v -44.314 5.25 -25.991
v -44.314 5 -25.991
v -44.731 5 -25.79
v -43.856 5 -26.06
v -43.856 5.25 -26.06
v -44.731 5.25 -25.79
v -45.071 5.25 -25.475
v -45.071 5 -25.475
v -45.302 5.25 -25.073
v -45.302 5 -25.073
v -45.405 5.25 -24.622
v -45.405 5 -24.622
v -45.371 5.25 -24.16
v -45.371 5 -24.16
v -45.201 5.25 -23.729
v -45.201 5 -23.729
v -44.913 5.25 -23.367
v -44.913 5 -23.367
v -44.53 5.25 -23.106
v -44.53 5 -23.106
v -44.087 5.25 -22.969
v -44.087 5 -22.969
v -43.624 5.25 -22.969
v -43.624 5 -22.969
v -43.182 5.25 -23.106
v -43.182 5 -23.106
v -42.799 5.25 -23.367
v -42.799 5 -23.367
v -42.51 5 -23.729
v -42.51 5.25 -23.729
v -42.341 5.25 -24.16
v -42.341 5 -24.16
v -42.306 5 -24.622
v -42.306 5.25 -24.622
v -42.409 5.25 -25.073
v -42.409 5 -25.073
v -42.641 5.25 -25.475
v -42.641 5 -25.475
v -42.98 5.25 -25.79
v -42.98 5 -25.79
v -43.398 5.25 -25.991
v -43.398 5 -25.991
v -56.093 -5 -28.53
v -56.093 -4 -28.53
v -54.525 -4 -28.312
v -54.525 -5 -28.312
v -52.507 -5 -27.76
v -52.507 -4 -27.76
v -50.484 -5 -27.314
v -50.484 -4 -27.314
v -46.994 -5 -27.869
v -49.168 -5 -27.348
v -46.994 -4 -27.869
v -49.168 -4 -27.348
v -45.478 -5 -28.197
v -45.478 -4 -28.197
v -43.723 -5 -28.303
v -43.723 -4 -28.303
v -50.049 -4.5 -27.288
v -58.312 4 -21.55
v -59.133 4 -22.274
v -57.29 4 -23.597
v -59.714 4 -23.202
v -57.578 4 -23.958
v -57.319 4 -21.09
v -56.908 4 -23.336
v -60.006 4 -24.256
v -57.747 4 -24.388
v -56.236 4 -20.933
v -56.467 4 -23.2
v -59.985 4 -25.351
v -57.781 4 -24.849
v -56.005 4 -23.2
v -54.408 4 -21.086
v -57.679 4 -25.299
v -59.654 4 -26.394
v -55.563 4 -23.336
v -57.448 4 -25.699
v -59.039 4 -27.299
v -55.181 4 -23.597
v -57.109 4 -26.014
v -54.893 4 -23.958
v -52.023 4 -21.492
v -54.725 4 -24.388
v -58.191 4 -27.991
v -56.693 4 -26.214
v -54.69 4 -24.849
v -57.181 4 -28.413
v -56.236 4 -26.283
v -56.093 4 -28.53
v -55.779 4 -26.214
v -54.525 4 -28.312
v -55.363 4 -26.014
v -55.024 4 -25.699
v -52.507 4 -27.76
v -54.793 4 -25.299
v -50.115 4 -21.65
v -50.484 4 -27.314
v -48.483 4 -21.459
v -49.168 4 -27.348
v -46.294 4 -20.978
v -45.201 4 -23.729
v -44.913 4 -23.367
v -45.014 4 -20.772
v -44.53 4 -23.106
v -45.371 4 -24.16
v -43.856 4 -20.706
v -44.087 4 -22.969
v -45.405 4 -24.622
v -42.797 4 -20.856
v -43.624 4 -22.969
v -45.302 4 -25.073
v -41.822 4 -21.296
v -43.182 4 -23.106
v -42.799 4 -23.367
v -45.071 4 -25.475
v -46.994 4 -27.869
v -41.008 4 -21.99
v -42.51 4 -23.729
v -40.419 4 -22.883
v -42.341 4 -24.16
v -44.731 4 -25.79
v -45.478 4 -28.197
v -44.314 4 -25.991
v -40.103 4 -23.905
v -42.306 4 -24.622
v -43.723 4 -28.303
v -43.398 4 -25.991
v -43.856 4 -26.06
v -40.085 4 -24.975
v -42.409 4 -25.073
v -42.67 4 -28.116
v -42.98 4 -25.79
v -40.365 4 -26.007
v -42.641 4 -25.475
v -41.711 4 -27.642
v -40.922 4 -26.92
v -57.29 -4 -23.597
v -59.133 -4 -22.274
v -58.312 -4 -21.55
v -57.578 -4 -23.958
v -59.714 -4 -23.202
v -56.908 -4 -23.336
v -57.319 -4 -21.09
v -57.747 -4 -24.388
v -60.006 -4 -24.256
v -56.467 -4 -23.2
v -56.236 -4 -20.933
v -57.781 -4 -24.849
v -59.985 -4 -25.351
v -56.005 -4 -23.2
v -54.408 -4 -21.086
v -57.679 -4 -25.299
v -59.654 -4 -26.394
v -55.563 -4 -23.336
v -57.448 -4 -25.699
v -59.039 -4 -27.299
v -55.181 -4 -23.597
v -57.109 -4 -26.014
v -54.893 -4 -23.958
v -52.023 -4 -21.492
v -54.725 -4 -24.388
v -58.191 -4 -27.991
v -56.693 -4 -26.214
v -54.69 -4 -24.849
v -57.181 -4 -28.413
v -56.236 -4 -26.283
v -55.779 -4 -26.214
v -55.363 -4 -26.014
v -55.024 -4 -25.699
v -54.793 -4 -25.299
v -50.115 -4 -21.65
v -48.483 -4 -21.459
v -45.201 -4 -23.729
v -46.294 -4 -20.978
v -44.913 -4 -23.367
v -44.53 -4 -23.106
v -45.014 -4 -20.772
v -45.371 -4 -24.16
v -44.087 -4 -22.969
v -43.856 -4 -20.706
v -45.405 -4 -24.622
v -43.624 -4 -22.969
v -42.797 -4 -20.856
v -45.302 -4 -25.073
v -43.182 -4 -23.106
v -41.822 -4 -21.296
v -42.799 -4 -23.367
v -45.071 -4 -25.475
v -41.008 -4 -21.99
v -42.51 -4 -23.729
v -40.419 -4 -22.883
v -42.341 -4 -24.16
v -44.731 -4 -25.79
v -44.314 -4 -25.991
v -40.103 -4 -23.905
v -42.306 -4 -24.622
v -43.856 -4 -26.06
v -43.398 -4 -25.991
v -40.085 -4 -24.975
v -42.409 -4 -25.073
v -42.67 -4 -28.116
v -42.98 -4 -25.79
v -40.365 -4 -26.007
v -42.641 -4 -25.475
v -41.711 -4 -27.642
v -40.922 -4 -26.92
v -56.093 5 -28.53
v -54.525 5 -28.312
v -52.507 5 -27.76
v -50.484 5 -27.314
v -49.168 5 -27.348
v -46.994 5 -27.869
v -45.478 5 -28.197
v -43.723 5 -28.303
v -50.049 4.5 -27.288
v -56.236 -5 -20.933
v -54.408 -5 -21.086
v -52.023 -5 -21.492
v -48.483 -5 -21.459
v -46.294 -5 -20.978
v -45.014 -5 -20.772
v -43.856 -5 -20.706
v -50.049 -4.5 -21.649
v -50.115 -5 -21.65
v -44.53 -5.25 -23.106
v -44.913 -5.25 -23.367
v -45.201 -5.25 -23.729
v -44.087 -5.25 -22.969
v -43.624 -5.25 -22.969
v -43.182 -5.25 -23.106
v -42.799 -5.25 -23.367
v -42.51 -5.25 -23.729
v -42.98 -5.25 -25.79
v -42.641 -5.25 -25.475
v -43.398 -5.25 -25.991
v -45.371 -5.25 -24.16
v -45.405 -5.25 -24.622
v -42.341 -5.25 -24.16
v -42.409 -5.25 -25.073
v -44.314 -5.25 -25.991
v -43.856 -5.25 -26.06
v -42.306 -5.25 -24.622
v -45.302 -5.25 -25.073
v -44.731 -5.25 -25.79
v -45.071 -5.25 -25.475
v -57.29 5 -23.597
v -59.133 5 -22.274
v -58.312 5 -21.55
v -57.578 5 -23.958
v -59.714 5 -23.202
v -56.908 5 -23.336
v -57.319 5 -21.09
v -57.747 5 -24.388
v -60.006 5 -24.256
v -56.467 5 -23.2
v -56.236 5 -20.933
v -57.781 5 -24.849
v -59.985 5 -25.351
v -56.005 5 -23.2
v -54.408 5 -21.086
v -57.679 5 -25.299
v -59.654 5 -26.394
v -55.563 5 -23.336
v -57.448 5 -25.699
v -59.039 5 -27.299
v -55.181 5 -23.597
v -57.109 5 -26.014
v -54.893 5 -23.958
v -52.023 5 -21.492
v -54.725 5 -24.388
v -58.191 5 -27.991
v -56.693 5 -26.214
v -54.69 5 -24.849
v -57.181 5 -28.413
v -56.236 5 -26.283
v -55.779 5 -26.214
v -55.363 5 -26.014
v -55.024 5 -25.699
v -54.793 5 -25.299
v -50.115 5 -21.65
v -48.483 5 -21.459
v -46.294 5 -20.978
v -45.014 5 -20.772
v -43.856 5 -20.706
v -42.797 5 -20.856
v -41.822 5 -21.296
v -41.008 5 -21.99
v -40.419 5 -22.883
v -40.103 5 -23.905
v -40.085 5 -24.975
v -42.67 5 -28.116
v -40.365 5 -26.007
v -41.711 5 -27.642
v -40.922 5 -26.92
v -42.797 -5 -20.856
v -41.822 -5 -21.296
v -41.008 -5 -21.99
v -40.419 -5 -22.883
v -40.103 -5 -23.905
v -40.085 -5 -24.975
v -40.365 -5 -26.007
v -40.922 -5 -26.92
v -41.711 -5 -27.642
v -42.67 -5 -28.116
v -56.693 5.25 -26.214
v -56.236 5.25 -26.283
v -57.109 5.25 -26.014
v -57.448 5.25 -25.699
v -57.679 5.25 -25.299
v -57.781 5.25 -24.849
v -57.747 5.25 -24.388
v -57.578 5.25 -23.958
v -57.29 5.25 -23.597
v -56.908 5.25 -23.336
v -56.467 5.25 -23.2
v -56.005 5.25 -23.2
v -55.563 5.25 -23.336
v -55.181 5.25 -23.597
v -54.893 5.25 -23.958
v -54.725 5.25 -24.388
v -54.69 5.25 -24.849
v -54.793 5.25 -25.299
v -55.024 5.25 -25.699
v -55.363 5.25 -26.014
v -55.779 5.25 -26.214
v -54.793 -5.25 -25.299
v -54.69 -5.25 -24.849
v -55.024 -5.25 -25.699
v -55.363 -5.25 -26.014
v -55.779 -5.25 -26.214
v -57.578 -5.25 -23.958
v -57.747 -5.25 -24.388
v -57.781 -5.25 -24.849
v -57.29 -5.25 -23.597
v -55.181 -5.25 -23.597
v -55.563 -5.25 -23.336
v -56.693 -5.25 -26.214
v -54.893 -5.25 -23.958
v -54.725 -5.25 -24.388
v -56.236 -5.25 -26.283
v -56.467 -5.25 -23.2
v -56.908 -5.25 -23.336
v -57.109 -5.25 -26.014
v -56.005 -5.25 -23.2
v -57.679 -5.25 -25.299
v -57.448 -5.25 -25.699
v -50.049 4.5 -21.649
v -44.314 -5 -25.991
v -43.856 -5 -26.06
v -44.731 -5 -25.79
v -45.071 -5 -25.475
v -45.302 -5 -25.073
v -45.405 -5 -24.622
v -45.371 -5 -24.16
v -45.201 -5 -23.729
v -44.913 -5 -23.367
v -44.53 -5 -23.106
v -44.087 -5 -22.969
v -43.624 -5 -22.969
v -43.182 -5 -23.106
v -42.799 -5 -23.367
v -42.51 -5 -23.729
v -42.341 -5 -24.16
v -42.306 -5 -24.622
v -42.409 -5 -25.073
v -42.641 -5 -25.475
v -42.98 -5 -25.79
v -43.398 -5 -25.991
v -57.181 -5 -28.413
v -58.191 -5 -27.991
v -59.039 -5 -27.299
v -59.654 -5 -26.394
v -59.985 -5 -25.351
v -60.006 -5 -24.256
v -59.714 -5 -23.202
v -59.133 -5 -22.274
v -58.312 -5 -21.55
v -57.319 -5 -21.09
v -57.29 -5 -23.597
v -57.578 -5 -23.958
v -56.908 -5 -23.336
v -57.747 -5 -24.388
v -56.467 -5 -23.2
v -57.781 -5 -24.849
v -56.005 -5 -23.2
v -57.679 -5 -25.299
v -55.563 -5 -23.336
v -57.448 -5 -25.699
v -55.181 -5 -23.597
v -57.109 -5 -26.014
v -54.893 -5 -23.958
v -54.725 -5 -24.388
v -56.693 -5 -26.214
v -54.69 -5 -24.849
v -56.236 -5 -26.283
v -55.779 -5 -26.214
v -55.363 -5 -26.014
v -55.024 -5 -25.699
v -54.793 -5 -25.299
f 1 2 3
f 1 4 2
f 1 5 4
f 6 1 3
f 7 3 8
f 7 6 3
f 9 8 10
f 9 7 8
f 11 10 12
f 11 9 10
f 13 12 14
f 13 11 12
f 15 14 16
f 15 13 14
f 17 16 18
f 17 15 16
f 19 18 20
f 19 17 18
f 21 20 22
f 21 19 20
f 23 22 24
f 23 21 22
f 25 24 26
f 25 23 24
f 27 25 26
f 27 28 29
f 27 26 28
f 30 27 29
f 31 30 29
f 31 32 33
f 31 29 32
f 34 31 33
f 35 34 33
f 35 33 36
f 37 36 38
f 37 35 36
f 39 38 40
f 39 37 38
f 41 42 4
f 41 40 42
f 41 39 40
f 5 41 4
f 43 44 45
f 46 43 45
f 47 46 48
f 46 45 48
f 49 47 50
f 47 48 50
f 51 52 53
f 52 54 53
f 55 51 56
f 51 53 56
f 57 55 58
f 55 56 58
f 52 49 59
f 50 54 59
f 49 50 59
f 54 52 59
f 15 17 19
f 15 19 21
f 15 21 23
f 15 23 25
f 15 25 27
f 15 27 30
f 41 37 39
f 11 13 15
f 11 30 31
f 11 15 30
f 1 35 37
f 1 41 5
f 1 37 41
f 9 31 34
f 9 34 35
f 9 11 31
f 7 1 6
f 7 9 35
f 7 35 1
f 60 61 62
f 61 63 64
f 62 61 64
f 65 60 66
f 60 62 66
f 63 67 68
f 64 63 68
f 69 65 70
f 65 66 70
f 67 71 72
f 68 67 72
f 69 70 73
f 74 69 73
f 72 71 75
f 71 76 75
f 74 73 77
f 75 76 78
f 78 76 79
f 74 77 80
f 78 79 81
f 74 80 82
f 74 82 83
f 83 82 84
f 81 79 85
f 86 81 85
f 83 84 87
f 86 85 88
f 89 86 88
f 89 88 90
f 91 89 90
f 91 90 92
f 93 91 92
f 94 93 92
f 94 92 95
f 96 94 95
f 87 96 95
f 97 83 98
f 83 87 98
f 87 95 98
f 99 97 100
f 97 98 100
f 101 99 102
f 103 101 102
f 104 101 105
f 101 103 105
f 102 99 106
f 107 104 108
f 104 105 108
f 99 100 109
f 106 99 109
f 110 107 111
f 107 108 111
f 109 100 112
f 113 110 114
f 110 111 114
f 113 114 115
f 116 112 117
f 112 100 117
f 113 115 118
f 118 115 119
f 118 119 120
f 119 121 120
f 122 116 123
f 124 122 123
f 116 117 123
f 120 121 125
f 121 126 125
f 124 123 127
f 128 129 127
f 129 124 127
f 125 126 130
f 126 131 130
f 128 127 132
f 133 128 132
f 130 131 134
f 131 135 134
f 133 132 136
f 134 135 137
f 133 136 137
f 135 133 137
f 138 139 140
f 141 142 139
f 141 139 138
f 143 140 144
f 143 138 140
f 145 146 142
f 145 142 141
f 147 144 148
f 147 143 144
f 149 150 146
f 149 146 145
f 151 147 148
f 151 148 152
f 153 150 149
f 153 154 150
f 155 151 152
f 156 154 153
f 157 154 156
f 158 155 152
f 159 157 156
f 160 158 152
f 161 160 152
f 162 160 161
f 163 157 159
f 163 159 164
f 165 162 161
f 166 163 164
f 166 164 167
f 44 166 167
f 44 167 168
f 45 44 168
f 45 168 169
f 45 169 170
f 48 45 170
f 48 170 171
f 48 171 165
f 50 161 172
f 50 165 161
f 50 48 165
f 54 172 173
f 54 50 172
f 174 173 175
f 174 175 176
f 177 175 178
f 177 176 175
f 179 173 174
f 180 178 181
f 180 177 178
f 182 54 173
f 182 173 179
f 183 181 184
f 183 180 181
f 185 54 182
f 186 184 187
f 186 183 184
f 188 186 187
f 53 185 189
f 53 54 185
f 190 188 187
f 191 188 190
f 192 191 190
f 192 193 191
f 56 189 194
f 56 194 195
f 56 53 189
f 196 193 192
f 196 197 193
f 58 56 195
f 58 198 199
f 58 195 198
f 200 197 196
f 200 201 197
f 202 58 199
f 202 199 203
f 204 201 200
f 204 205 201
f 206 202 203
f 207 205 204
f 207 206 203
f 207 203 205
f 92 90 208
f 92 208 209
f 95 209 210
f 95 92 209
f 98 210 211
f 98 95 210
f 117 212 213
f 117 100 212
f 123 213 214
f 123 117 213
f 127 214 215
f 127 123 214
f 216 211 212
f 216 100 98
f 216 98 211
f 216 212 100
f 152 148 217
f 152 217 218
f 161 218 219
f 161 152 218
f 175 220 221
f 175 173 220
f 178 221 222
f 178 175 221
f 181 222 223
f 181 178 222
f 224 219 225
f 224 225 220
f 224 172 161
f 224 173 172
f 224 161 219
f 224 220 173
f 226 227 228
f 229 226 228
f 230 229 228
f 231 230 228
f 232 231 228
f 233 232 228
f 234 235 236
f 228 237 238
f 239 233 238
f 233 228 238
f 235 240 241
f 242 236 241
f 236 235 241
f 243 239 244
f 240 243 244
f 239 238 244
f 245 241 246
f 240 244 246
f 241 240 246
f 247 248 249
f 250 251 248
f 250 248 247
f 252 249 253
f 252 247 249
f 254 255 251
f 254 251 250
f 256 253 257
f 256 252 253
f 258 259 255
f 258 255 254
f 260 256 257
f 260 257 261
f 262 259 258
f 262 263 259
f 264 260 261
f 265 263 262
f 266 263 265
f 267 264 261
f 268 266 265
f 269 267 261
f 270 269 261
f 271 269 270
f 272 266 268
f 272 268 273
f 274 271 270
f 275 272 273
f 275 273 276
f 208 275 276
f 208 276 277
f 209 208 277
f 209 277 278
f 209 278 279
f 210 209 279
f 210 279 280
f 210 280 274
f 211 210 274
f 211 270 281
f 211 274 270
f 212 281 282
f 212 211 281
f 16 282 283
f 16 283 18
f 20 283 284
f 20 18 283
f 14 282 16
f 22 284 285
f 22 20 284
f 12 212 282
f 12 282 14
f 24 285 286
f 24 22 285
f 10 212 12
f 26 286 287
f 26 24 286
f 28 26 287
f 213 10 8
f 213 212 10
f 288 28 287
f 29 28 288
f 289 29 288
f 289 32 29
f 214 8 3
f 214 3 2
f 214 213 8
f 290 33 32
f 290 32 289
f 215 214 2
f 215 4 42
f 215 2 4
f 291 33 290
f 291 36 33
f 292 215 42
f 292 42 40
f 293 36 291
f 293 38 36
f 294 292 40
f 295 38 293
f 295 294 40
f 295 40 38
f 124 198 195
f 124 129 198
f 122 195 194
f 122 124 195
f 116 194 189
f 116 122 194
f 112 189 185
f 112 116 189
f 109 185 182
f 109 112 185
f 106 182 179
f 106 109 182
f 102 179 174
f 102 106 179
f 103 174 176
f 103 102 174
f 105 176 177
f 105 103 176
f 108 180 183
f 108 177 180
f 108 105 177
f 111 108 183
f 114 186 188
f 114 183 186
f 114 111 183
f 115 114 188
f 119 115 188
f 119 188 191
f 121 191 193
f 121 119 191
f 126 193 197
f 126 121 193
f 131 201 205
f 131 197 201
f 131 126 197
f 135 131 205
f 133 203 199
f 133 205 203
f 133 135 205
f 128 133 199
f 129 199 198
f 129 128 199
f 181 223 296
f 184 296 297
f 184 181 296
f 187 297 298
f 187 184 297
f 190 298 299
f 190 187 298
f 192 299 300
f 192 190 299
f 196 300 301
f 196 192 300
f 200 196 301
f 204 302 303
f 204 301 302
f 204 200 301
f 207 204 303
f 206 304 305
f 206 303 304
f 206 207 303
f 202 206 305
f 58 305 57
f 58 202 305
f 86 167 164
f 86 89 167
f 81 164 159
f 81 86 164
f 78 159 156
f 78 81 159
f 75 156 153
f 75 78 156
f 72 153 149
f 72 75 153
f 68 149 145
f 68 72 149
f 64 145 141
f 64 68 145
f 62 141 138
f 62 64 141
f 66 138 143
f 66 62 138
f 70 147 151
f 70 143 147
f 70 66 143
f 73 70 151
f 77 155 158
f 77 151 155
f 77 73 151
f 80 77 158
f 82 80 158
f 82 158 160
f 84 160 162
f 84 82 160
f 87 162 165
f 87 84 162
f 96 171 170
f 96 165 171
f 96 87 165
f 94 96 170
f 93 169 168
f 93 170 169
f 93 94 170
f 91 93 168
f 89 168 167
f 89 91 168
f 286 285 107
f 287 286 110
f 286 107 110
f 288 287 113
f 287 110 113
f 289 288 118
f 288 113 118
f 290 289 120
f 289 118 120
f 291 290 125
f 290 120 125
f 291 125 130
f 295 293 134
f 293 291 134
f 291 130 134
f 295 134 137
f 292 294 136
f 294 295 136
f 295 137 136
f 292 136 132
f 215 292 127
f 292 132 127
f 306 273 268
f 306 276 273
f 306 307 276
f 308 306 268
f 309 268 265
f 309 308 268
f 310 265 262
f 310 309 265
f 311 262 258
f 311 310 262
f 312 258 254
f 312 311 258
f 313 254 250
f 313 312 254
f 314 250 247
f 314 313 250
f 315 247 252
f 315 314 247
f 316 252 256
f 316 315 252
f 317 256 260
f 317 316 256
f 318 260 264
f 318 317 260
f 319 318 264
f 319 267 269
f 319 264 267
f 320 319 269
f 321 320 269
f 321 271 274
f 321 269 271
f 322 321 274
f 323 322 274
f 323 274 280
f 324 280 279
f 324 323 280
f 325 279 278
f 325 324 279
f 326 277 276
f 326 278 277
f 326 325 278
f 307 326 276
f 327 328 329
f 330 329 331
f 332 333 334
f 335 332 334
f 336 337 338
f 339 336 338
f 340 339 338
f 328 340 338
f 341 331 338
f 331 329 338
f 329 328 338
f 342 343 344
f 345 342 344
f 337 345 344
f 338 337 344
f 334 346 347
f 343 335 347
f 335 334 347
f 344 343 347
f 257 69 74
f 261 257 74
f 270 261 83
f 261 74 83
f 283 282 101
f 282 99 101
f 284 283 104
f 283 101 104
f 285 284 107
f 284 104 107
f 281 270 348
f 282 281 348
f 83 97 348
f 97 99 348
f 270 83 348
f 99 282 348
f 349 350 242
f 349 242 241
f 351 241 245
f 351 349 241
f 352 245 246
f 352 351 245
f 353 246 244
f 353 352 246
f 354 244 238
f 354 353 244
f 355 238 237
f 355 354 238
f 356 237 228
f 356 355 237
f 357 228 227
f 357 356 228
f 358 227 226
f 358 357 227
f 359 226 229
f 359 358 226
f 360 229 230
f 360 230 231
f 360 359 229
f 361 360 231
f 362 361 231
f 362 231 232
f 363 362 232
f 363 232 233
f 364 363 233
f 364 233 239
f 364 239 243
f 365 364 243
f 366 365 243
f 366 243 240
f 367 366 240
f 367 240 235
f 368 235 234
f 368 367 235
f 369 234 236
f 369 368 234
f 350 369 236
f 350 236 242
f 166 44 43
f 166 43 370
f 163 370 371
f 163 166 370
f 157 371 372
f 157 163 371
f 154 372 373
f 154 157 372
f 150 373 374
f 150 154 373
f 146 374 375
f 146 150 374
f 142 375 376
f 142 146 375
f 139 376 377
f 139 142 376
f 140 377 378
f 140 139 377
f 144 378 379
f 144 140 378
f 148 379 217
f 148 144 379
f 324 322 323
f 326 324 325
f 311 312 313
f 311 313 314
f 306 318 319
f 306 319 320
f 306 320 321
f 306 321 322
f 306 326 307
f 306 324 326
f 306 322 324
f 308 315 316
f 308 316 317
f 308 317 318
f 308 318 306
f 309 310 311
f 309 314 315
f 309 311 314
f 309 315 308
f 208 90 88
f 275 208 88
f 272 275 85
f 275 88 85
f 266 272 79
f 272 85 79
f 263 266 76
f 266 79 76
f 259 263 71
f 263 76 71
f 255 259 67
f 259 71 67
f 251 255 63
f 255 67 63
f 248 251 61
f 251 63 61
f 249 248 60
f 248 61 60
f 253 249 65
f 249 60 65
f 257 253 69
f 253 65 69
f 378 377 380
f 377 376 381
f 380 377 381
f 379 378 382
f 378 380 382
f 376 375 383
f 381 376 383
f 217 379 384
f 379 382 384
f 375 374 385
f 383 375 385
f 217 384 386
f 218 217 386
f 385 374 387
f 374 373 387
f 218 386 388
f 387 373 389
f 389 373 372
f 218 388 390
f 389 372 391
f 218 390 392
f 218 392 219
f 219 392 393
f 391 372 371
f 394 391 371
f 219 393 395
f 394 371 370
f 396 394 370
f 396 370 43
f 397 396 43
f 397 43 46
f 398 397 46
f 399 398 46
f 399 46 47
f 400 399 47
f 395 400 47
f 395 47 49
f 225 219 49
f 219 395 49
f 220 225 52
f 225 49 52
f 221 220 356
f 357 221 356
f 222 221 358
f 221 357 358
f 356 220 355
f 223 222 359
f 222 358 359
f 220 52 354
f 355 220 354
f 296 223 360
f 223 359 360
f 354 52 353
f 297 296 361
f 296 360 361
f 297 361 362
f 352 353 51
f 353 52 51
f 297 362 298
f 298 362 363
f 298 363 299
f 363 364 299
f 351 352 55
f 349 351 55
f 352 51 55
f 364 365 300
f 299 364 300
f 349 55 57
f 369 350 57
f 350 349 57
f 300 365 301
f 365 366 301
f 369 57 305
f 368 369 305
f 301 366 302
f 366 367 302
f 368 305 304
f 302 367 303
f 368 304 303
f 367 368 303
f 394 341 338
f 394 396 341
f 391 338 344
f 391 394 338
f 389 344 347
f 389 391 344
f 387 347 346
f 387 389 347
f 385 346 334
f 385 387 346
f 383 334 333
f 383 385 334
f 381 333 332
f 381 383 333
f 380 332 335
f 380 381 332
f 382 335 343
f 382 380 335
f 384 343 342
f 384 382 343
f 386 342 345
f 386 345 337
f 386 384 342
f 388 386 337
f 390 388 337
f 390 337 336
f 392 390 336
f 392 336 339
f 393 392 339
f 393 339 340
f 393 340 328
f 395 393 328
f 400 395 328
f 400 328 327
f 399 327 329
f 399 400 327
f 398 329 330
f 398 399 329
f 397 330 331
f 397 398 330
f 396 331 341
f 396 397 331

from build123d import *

# Parameters (mm, degrees)
EXTRUDE_START    = 4
SKETCH_1_R       = 1.553894019
SKETCH_1_R_2     = 1.55
EXTRUDE_7_DEPTH  = 1
EXTRUDE_START_2  = -4
SKETCH_6_R       = 1.55
SKETCH_6_R_2     = 1.553894019
EXTRUDE_11_DEPTH = 1
SKETCH_4_R       = 1.55
EXTRUDE_12_DEPTH = 5.25
SKETCH_4_5_R     = 1.55
SKETCH_4_5_R_2   = 1.553894019
EXTRUDE_13_DEPTH = 5.25


with BuildPart() as part:
    # 草图1 → 凸台-拉伸7 (new body)
    with BuildSketch(Plane(origin=(0, 0, 0), x_dir=(1, 0, 0), z_dir=(0, 1, 0)).offset(EXTRUDE_START)):
        with BuildLine():
            add(Edge.make_bspline(
                [(-56.093079937, 28.530189917), (-53.942583983, 28.449408827), (-49.768599584, 26.149491118), (-46.433977381, 28.398120151), (-43.723017894, 28.303389675)],
                knots=[0, 0, 0, 0, 0.490575379, 1, 1, 1, 1], degree=3))
            ThreePointArc((-56.093079937, 28.530189917), (-60.035052689, 24.804201821), (-56.235722287, 20.932868077))
            add(Edge.make_bspline(
                [(-56.235722287, 20.932868077), (-54.105831048, 20.932868077), (-49.896032342, 22.477788173), (-46.252423284, 20.705707547), (-43.855722287, 20.705707547)],
                knots=[0, 0, 0, 0, 0.498510271, 1, 1, 1, 1], degree=3))
            ThreePointArc((-43.855722287, 20.705707547), (-40.0563018, 24.43934523), (-43.723017894, 28.303389675))
        make_face()
        with Locations((-43.855722287, 24.505707547)):
            Circle(SKETCH_1_R, mode=Mode.SUBTRACT)
        with Locations((-56.235722287, 24.732868077)):
            Circle(SKETCH_1_R_2, mode=Mode.SUBTRACT)
    extrude(amount=EXTRUDE_7_DEPTH)



with BuildPart() as body_2:
    # 草图6 → 凸台-拉伸11 (new body)
    with BuildSketch(Plane(origin=(0, 0, 0), x_dir=(1, 0, 0), z_dir=(0, 1, 0)).offset(EXTRUDE_START_2)):
        with BuildLine():
            ThreePointArc((-56.093079937, 28.530189917), (-60.035052689, 24.804201821), (-56.235722287, 20.932868077))
            add(Edge.make_bspline(
                [(-56.235722287, 20.932868077), (-54.105831048, 20.932868077), (-49.896032342, 22.477788173), (-46.252423284, 20.705707547), (-43.855722287, 20.705707547)],
                knots=[0, 0, 0, 0, 0.498510271, 1, 1, 1, 1], degree=3))
            ThreePointArc((-43.855722287, 20.705707547), (-40.0563018, 24.43934523), (-43.723017894, 28.303389675))
            add(Edge.make_bspline(
                [(-56.093079937, 28.530189917), (-53.942583983, 28.449408827), (-49.768599584, 26.149491118), (-46.433977381, 28.398120151), (-43.723017894, 28.303389675)],
                knots=[0, 0, 0, 0, 0.490575379, 1, 1, 1, 1], degree=3))
        make_face()
        with Locations((-56.235722287, 24.732868077)):
            Circle(SKETCH_6_R, mode=Mode.SUBTRACT)
        with Locations((-43.855722287, 24.505707547)):
            Circle(SKETCH_6_R_2, mode=Mode.SUBTRACT)
    extrude(amount=-EXTRUDE_11_DEPTH)


with BuildPart() as part_1:
    add(part.part)

    add(body_2.part)  # 凸台-拉伸12 merges body 2
    # 草图4 → 凸台-拉伸12 (add, symmetric)
    with BuildSketch(Plane(origin=(0, 0, 0), x_dir=(1, 0, 0), z_dir=(0, 1, 0))):
        with Locations((-56.235722287, 24.732868077)):
            Circle(SKETCH_4_R)
    extrude(amount=EXTRUDE_12_DEPTH, both=True)

    # 草图4<5> → 凸台-拉伸13 (add, symmetric)
    with BuildSketch(Plane(origin=(0, 0, 0), x_dir=(1, 0, 0), z_dir=(0, 1, 0))):
        with Locations((-56.235722287, 24.732868077)):
            Circle(SKETCH_4_5_R)
        with Locations((-43.855722287, 24.505707547)):
            Circle(SKETCH_4_5_R_2)
    extrude(amount=EXTRUDE_13_DEPTH, both=True)


solid = part_1.part
